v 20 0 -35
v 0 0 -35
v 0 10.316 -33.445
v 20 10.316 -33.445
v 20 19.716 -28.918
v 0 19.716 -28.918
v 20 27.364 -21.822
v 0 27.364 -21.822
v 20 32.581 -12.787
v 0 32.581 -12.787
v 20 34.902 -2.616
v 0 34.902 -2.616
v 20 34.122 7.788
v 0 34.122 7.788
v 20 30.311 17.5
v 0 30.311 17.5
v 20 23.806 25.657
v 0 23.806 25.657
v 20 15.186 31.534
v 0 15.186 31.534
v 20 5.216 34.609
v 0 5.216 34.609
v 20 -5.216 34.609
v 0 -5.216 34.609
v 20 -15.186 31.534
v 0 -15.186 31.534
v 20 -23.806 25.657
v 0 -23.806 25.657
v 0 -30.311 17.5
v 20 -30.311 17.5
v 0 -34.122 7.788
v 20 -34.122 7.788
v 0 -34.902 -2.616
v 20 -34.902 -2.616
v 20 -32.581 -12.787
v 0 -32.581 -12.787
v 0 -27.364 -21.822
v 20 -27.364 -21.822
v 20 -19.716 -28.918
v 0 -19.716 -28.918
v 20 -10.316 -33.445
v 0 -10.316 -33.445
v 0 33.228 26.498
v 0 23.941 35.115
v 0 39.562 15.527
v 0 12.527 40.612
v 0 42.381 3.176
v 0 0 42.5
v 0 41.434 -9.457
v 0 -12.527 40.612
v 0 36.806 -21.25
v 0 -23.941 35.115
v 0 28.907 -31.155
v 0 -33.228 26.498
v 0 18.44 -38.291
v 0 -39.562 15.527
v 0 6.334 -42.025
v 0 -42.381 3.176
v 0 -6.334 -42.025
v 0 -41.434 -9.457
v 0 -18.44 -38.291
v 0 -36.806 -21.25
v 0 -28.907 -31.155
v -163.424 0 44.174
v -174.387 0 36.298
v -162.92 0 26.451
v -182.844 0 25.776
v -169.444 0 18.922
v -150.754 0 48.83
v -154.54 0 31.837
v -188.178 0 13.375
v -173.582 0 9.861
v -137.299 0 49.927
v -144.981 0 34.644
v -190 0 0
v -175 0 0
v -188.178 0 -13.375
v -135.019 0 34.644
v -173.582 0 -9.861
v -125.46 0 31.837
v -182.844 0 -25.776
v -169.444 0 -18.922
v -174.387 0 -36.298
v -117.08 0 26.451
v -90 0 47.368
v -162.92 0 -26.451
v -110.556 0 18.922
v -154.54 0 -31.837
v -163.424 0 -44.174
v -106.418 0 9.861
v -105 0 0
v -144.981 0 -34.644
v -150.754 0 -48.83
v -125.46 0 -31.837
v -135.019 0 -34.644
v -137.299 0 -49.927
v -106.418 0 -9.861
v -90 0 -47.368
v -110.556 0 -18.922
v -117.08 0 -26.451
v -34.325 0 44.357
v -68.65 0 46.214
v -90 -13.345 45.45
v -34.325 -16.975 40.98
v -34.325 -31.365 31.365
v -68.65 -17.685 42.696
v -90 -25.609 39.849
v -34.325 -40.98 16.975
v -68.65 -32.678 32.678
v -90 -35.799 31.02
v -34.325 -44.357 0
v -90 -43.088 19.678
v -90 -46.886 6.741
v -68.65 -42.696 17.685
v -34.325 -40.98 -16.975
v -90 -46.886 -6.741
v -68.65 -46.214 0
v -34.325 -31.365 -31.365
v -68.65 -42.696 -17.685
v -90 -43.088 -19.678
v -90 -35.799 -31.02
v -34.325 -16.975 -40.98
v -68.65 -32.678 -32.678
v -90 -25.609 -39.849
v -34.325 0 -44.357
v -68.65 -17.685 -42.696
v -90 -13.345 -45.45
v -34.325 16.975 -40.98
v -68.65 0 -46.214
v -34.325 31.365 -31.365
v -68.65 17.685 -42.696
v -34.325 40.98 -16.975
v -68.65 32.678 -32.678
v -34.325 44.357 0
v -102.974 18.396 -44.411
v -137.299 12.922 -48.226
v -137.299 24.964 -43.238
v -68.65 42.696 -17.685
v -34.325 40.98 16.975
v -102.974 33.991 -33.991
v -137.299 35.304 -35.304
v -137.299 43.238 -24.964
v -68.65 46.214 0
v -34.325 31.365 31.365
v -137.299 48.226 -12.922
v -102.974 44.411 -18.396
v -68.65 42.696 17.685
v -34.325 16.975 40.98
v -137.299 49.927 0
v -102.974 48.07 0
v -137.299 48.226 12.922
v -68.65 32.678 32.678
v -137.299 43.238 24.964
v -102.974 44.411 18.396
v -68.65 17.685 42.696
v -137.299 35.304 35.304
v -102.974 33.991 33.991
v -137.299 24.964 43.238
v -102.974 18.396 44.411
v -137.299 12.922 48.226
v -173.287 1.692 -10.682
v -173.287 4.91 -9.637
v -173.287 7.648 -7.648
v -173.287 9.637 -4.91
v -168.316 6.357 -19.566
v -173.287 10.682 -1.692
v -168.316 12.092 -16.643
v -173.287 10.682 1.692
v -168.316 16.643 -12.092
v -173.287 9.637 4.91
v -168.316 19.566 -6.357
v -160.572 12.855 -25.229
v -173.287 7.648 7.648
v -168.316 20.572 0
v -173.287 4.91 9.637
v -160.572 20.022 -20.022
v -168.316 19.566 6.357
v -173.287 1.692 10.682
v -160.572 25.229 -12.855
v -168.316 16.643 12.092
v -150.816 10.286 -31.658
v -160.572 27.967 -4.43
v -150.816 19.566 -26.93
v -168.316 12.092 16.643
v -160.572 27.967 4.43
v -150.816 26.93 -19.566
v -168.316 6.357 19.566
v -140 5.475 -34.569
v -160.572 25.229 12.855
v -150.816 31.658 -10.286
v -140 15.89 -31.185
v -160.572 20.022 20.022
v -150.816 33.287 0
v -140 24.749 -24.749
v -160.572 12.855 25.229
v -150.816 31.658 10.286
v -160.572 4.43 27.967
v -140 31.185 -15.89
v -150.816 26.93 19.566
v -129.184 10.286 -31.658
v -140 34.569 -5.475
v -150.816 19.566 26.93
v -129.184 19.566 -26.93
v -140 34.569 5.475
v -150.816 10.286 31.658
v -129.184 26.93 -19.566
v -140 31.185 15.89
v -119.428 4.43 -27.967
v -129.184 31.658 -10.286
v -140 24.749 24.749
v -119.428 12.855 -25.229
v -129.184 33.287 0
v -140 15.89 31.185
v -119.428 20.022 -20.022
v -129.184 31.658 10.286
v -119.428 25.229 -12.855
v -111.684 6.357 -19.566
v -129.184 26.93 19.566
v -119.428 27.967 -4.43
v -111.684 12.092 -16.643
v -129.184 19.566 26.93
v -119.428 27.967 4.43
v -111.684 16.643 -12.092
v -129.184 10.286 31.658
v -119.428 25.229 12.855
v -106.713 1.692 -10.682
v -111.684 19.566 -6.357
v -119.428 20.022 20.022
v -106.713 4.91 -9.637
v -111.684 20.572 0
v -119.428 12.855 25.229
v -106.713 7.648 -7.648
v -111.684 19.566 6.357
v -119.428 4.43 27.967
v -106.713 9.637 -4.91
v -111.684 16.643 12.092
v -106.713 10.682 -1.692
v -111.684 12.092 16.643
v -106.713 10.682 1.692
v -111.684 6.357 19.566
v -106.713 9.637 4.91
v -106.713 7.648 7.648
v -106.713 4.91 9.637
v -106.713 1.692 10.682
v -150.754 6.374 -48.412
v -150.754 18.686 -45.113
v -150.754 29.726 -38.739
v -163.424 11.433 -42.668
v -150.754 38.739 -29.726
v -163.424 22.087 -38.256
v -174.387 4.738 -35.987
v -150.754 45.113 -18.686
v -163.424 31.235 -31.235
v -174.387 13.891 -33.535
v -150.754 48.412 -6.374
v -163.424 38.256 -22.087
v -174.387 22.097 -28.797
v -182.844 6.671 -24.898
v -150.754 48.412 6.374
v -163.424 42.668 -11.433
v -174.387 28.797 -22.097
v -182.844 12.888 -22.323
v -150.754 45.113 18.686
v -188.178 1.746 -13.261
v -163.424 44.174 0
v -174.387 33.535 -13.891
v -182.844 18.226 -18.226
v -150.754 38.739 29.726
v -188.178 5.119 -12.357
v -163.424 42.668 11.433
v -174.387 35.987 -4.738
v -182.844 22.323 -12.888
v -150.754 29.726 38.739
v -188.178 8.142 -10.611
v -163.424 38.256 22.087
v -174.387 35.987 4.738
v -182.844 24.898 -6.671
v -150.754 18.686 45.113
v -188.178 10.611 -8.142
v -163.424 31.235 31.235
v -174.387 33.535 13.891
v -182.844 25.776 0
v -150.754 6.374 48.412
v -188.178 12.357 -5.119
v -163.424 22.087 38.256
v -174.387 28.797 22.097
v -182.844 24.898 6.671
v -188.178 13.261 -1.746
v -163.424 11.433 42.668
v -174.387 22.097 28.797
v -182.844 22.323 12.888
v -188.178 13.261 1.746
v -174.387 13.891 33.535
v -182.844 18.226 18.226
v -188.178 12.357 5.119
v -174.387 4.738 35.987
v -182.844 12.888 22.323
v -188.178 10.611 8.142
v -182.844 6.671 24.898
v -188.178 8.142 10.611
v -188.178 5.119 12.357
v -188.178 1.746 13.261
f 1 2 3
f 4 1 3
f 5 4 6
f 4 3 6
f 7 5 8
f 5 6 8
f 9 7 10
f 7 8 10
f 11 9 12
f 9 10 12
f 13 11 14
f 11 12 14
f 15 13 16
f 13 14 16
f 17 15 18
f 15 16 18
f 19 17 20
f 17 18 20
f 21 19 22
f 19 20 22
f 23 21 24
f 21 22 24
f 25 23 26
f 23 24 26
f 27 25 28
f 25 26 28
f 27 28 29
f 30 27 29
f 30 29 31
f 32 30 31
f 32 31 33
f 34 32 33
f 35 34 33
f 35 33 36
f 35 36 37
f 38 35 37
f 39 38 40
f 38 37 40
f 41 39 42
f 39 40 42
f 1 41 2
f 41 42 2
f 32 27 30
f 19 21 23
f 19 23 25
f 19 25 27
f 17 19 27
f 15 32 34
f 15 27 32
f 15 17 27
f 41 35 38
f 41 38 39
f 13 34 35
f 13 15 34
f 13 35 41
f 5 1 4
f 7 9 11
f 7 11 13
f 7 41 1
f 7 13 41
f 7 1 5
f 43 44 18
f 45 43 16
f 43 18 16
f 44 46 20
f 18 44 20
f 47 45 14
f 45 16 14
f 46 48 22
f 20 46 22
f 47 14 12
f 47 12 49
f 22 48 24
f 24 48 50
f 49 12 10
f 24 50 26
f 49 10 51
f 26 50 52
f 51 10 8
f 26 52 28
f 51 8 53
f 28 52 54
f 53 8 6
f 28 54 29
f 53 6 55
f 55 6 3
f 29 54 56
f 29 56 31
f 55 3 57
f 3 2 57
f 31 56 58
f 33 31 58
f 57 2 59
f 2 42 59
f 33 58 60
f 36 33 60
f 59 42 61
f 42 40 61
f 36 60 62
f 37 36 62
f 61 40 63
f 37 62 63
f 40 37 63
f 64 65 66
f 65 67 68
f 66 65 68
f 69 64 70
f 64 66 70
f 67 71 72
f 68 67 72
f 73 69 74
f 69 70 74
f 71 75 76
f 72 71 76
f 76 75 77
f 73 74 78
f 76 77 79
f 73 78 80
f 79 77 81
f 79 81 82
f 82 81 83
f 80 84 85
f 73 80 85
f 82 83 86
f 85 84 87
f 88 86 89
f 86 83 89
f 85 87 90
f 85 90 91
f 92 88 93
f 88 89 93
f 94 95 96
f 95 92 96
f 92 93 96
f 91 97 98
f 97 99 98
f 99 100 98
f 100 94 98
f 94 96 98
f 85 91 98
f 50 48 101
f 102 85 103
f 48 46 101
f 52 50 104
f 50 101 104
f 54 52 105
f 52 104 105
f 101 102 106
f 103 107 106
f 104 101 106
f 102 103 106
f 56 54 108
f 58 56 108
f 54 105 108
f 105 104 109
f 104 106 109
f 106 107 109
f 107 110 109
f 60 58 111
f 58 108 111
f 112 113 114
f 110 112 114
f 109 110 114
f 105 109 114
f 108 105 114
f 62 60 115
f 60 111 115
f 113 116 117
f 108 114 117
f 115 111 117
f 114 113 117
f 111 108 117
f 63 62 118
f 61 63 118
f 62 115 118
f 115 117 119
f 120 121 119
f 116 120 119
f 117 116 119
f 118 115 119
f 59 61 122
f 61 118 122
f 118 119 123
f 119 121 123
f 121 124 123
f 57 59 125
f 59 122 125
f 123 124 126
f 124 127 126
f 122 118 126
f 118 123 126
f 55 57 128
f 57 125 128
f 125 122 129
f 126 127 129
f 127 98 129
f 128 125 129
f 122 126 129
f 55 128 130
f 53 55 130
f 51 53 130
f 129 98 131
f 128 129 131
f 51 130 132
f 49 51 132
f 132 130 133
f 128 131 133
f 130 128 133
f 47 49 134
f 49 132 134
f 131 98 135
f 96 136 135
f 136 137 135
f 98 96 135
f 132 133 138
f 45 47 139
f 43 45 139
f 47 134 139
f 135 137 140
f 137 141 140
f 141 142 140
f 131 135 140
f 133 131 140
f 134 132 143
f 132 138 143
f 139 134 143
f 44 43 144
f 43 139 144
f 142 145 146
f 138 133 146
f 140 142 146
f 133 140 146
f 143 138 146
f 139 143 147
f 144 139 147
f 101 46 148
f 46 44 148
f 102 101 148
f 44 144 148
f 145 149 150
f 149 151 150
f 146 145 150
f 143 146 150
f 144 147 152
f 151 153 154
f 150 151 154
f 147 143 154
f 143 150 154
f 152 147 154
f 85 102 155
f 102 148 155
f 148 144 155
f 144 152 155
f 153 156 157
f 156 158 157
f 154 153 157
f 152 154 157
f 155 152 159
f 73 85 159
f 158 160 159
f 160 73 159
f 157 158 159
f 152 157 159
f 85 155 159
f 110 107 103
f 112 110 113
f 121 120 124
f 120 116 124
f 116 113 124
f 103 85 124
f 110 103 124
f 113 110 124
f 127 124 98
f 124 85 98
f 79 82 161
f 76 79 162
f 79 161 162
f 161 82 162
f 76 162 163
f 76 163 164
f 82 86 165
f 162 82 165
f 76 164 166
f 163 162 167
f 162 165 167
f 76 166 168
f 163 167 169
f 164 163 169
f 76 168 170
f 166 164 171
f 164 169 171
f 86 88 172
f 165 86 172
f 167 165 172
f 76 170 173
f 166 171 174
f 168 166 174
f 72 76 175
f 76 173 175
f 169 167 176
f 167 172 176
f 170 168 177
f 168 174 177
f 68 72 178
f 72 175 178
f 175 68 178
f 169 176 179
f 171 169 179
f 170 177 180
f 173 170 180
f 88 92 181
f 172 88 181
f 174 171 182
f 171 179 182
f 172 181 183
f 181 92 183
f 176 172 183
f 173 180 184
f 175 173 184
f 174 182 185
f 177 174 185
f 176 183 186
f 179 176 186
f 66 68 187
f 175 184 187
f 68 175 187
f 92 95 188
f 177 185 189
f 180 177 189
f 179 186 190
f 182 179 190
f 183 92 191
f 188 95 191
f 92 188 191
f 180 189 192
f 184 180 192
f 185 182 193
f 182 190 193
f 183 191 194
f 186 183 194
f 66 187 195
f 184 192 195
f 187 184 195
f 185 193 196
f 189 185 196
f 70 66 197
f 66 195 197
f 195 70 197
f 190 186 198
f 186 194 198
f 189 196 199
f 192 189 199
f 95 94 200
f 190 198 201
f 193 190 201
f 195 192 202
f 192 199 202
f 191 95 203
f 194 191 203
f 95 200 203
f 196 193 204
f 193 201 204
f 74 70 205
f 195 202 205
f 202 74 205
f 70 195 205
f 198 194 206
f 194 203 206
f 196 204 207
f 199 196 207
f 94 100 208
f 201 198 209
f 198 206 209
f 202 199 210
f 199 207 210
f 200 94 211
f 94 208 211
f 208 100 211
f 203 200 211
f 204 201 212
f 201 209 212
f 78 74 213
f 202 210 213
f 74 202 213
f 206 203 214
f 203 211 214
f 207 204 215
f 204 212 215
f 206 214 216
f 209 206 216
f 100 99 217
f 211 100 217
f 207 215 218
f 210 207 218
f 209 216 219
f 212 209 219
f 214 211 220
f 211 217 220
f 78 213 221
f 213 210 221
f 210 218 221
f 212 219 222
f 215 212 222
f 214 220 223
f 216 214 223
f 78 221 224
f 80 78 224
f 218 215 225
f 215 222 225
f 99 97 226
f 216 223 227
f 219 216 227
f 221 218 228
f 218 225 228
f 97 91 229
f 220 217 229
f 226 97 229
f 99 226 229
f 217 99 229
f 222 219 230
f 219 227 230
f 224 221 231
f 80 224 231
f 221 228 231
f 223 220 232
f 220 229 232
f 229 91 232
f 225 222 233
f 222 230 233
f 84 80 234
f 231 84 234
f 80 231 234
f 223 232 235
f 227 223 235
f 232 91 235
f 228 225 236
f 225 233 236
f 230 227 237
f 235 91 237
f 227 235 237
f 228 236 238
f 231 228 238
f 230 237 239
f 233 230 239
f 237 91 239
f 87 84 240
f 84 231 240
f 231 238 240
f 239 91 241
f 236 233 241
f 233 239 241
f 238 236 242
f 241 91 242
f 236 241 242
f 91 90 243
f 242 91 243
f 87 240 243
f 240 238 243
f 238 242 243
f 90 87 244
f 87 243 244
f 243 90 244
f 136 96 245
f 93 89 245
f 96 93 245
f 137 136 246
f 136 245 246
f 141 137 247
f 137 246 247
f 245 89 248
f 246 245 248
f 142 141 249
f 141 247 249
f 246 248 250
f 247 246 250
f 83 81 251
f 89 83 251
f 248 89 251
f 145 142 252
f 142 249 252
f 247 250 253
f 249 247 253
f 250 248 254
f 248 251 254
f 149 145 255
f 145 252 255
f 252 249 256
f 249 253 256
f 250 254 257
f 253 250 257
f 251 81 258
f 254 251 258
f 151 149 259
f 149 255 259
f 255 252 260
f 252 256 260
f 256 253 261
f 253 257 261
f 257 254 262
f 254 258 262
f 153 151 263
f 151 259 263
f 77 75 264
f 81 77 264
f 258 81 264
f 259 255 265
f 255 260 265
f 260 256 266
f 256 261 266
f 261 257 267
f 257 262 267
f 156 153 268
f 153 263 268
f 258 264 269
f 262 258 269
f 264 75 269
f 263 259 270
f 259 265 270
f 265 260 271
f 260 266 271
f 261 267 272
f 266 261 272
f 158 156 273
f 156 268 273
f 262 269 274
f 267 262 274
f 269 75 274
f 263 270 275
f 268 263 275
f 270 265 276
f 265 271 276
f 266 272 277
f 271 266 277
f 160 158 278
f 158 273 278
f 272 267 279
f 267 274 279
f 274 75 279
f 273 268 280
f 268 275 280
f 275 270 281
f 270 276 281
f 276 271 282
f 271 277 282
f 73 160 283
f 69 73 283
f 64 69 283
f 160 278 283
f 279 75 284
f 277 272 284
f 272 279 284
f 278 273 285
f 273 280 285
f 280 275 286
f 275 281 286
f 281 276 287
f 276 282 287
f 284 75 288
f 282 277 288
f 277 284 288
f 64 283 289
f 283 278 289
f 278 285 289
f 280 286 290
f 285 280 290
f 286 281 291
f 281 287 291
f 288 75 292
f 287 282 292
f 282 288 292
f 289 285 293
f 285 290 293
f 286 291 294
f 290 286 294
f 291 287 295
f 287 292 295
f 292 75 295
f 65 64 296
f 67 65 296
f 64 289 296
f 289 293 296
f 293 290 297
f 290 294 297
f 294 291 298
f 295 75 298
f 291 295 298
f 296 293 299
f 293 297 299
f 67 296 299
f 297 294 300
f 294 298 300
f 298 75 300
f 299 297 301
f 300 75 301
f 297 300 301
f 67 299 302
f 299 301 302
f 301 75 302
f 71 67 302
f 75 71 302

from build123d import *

# Parameters (mm, degrees)
SKETCH2_W           = 100
SKETCH2_H           = 100
CUT_EXTRUDE1_DEPTH  = 62
SKETCH3_R           = 35
BOSS_EXTRUDE1_DEPTH = 20


with BuildPart() as part:
    # Sketch1 → Revolve1 (revolve)
    with BuildSketch(Plane(origin=(0, 0, 0), x_dir=(1, 0, 0), z_dir=(0, 1, 0)), mode=Mode.PRIVATE) as revolve1_sk:
        with BuildLine():
            Line((0, 0), (0, 42.5))
            Line((0, 42.5), (-137.299270073, 49.927007299))
            ThreePointArc((-137.299270073, 49.927007299), (-174.387232396, 36.297634195), (-190, 0))
            Line((-190, 0), (-175, 0))
            ThreePointArc((-175, 0), (-140, 35), (-105, 0))
            Line((-105, 0), (0, 0))
        make_face()
    revolve(revolve1_sk.sketch.rotate(Axis((-105, 0, 0), (1, 0, 0)), 180), axis=Axis((-105, 0, 0), (1, 0, 0)))

    # Sketch2 → Cut-Extrude1 (cut)
    with BuildSketch(Plane(origin=(0, 0, 0), x_dir=(1, 0, 0), z_dir=(0, 1, 0))):
        with Locations((-140, 0)):
            Rectangle(SKETCH2_W, SKETCH2_H)
    extrude(amount=-CUT_EXTRUDE1_DEPTH, mode=Mode.SUBTRACT)

    # Sketch3 → Boss-Extrude1 (add)
    with BuildSketch(Plane(origin=(0, 0, 0), x_dir=(0, 0, -1), z_dir=(1, 0, 0))):
        Circle(SKETCH3_R)
    extrude(amount=BOSS_EXTRUDE1_DEPTH)


solid = part.part
